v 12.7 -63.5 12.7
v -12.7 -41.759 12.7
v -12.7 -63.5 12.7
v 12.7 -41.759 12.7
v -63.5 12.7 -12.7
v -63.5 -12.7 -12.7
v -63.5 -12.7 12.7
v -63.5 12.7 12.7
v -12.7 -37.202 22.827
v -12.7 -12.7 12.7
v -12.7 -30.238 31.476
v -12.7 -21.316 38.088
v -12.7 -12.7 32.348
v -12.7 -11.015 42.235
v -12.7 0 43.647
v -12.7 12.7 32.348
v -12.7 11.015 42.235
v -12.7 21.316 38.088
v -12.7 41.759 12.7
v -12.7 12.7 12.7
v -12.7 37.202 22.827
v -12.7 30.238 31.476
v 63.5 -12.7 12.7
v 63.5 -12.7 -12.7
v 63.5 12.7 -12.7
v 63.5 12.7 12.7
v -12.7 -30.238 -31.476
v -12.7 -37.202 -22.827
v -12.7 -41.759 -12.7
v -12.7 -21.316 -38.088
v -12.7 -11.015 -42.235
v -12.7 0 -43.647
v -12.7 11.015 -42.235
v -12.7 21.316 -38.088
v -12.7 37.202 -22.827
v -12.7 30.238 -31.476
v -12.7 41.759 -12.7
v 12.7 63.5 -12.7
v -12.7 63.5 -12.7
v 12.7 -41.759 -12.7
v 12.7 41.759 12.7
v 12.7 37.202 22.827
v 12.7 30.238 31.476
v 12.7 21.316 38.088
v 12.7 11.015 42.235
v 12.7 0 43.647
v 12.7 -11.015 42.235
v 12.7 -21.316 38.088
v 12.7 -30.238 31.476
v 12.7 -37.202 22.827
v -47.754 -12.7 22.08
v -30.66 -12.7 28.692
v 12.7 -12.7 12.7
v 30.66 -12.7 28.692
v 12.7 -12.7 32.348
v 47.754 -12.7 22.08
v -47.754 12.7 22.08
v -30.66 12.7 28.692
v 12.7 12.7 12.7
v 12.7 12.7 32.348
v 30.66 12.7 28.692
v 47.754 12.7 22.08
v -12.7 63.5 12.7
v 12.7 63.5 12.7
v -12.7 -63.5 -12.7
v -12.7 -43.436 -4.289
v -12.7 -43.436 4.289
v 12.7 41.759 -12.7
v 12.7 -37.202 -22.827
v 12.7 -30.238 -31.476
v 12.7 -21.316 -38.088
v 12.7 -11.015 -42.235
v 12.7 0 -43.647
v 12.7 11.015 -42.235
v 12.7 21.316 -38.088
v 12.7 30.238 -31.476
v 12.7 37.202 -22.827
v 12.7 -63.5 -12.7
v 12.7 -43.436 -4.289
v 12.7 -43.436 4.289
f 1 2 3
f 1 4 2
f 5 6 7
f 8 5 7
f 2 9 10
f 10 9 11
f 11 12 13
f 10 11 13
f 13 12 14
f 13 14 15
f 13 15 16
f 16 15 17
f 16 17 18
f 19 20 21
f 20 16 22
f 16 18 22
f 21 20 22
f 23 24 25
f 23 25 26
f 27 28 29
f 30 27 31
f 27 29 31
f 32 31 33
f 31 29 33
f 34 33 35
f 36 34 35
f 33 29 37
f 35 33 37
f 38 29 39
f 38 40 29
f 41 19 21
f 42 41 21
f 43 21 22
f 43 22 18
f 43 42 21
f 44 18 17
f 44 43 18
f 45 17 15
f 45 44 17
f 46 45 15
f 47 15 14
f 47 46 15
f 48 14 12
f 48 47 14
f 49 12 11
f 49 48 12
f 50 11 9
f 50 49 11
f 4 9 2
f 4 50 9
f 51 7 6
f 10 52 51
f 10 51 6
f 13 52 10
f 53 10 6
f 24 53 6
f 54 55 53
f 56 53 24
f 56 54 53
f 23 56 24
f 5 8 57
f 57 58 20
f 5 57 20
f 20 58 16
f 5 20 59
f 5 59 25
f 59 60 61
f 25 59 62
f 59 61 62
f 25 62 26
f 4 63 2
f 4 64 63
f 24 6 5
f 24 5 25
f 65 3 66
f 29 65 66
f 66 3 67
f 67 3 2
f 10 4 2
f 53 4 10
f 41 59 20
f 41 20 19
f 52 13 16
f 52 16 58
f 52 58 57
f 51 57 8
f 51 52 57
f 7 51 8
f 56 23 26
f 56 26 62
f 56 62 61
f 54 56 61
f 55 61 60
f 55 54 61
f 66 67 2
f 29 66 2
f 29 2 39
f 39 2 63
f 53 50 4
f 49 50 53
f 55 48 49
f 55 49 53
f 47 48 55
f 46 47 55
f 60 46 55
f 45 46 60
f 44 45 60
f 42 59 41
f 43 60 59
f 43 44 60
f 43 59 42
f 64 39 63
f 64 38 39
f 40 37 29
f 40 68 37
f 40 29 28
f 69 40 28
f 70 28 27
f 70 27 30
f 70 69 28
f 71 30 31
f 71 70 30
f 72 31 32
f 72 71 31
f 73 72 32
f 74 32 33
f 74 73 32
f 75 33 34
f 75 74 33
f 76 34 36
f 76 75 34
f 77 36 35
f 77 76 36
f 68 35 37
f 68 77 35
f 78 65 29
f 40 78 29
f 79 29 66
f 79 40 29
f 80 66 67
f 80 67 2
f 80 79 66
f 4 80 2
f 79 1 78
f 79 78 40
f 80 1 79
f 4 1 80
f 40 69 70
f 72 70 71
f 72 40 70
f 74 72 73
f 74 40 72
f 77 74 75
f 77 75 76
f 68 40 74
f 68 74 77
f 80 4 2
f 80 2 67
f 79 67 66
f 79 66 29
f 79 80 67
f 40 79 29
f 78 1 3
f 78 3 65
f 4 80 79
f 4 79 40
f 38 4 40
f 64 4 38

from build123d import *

# Parameters (mm, degrees)
F0_W     = 127
F0_H     = 25.4
F2_DEPTH = 12.7
F3_DEPTH = 12.7
F4_DEPTH = 12.7
F5_DEPTH = 12.7
F6_DEPTH = 12.7
F7_DEPTH = 12.7
F8_DEPTH = 12.7


with BuildPart() as f2:
    # F0 (on Front) → F2 (new body, symmetric)
    with BuildSketch(Plane.XZ):
        Rectangle(F0_W, F0_H)
    extrude(amount=F2_DEPTH, both=True)

    # F0 (on Front) → F4 (join, symmetric)
    with BuildSketch(Plane.XZ):
        with BuildLine():
            ThreePointArc((63.5, 12.7), (0, 33.089700587), (-63.5, 12.7))
            Line((-63.5, 12.7), (63.5, 12.7))
        make_face()
    extrude(amount=F4_DEPTH, both=True)

    # F1 (on Right) → F5 (join, symmetric)
    with BuildSketch(Plane.YZ):
        with BuildLine():
            ThreePointArc((41.7586787839, 12.7), (0, 43.6471906745), (-41.7586787839, 12.7))
            Line((-41.7586787839, 12.7), (41.7586787839, 12.7))
        make_face()
    extrude(amount=F5_DEPTH, both=True)


with BuildPart() as f3:
    # F1 (on Right) → F3 (new body, symmetric)
    with BuildSketch(Plane.YZ):
        with BuildLine():
            Line((-41.7586787839, 12.7), (-63.5, 12.7))
            Line((-63.5, 12.7), (-63.5, -12.7))
            Line((-63.5, -12.7), (-41.7586787839, -12.7))
            ThreePointArc((-41.7586787839, -12.7), (-43.6471906745, 0), (-41.7586787839, 12.7))
        make_face()
    extrude(amount=F3_DEPTH, both=True)


with BuildPart() as f6:
    # F1 (on Right) → F6 (new body, symmetric)
    with BuildSketch(Plane.YZ):
        with BuildLine():
            Line((41.7586787839, 12.7), (-41.7586787839, 12.7))
            ThreePointArc((-41.7586787839, 12.7), (-43.6471906745, 0), (-41.7586787839, -12.7))
            Line((-41.7586787839, -12.7), (41.7586787839, -12.7))
            ThreePointArc((41.7586787839, -12.7), (43.1724812177, -6.4198223722), (43.6471906745, 0))
            ThreePointArc((43.6471906745, 0), (43.1724812177, 6.4198223722), (41.7586787839, 12.7))
        make_face()
    extrude(amount=F6_DEPTH, both=True)

    # F1 (on Right) → F8 (join, symmetric)
    with BuildSketch(Plane.YZ):
        with BuildLine():
            Line((63.5, 12.7), (41.7586787839, 12.7))
            ThreePointArc((41.7586787839, 12.7), (43.1724812177, 6.4198223722), (43.6471906745, 0))
            ThreePointArc((43.6471906745, 0), (43.1724812177, -6.4198223722), (41.7586787839, -12.7))
            Line((41.7586787839, -12.7), (63.5, -12.7))
            Line((63.5, -12.7), (63.5, 12.7))
        make_face()
    extrude(amount=F8_DEPTH, both=True)


with BuildPart() as f7:
    # F1 (on Right) → F7 (new body, symmetric)
    with BuildSketch(Plane.YZ):
        with BuildLine():
            Line((41.7586787839, -12.7), (-41.7586787839, -12.7))
            ThreePointArc((-41.7586787839, -12.7), (0, -43.6471906745), (41.7586787839, -12.7))
        make_face()
    extrude(amount=F7_DEPTH, both=True)


solid = Compound([f2.part, f3.part, f6.part, f7.part])
